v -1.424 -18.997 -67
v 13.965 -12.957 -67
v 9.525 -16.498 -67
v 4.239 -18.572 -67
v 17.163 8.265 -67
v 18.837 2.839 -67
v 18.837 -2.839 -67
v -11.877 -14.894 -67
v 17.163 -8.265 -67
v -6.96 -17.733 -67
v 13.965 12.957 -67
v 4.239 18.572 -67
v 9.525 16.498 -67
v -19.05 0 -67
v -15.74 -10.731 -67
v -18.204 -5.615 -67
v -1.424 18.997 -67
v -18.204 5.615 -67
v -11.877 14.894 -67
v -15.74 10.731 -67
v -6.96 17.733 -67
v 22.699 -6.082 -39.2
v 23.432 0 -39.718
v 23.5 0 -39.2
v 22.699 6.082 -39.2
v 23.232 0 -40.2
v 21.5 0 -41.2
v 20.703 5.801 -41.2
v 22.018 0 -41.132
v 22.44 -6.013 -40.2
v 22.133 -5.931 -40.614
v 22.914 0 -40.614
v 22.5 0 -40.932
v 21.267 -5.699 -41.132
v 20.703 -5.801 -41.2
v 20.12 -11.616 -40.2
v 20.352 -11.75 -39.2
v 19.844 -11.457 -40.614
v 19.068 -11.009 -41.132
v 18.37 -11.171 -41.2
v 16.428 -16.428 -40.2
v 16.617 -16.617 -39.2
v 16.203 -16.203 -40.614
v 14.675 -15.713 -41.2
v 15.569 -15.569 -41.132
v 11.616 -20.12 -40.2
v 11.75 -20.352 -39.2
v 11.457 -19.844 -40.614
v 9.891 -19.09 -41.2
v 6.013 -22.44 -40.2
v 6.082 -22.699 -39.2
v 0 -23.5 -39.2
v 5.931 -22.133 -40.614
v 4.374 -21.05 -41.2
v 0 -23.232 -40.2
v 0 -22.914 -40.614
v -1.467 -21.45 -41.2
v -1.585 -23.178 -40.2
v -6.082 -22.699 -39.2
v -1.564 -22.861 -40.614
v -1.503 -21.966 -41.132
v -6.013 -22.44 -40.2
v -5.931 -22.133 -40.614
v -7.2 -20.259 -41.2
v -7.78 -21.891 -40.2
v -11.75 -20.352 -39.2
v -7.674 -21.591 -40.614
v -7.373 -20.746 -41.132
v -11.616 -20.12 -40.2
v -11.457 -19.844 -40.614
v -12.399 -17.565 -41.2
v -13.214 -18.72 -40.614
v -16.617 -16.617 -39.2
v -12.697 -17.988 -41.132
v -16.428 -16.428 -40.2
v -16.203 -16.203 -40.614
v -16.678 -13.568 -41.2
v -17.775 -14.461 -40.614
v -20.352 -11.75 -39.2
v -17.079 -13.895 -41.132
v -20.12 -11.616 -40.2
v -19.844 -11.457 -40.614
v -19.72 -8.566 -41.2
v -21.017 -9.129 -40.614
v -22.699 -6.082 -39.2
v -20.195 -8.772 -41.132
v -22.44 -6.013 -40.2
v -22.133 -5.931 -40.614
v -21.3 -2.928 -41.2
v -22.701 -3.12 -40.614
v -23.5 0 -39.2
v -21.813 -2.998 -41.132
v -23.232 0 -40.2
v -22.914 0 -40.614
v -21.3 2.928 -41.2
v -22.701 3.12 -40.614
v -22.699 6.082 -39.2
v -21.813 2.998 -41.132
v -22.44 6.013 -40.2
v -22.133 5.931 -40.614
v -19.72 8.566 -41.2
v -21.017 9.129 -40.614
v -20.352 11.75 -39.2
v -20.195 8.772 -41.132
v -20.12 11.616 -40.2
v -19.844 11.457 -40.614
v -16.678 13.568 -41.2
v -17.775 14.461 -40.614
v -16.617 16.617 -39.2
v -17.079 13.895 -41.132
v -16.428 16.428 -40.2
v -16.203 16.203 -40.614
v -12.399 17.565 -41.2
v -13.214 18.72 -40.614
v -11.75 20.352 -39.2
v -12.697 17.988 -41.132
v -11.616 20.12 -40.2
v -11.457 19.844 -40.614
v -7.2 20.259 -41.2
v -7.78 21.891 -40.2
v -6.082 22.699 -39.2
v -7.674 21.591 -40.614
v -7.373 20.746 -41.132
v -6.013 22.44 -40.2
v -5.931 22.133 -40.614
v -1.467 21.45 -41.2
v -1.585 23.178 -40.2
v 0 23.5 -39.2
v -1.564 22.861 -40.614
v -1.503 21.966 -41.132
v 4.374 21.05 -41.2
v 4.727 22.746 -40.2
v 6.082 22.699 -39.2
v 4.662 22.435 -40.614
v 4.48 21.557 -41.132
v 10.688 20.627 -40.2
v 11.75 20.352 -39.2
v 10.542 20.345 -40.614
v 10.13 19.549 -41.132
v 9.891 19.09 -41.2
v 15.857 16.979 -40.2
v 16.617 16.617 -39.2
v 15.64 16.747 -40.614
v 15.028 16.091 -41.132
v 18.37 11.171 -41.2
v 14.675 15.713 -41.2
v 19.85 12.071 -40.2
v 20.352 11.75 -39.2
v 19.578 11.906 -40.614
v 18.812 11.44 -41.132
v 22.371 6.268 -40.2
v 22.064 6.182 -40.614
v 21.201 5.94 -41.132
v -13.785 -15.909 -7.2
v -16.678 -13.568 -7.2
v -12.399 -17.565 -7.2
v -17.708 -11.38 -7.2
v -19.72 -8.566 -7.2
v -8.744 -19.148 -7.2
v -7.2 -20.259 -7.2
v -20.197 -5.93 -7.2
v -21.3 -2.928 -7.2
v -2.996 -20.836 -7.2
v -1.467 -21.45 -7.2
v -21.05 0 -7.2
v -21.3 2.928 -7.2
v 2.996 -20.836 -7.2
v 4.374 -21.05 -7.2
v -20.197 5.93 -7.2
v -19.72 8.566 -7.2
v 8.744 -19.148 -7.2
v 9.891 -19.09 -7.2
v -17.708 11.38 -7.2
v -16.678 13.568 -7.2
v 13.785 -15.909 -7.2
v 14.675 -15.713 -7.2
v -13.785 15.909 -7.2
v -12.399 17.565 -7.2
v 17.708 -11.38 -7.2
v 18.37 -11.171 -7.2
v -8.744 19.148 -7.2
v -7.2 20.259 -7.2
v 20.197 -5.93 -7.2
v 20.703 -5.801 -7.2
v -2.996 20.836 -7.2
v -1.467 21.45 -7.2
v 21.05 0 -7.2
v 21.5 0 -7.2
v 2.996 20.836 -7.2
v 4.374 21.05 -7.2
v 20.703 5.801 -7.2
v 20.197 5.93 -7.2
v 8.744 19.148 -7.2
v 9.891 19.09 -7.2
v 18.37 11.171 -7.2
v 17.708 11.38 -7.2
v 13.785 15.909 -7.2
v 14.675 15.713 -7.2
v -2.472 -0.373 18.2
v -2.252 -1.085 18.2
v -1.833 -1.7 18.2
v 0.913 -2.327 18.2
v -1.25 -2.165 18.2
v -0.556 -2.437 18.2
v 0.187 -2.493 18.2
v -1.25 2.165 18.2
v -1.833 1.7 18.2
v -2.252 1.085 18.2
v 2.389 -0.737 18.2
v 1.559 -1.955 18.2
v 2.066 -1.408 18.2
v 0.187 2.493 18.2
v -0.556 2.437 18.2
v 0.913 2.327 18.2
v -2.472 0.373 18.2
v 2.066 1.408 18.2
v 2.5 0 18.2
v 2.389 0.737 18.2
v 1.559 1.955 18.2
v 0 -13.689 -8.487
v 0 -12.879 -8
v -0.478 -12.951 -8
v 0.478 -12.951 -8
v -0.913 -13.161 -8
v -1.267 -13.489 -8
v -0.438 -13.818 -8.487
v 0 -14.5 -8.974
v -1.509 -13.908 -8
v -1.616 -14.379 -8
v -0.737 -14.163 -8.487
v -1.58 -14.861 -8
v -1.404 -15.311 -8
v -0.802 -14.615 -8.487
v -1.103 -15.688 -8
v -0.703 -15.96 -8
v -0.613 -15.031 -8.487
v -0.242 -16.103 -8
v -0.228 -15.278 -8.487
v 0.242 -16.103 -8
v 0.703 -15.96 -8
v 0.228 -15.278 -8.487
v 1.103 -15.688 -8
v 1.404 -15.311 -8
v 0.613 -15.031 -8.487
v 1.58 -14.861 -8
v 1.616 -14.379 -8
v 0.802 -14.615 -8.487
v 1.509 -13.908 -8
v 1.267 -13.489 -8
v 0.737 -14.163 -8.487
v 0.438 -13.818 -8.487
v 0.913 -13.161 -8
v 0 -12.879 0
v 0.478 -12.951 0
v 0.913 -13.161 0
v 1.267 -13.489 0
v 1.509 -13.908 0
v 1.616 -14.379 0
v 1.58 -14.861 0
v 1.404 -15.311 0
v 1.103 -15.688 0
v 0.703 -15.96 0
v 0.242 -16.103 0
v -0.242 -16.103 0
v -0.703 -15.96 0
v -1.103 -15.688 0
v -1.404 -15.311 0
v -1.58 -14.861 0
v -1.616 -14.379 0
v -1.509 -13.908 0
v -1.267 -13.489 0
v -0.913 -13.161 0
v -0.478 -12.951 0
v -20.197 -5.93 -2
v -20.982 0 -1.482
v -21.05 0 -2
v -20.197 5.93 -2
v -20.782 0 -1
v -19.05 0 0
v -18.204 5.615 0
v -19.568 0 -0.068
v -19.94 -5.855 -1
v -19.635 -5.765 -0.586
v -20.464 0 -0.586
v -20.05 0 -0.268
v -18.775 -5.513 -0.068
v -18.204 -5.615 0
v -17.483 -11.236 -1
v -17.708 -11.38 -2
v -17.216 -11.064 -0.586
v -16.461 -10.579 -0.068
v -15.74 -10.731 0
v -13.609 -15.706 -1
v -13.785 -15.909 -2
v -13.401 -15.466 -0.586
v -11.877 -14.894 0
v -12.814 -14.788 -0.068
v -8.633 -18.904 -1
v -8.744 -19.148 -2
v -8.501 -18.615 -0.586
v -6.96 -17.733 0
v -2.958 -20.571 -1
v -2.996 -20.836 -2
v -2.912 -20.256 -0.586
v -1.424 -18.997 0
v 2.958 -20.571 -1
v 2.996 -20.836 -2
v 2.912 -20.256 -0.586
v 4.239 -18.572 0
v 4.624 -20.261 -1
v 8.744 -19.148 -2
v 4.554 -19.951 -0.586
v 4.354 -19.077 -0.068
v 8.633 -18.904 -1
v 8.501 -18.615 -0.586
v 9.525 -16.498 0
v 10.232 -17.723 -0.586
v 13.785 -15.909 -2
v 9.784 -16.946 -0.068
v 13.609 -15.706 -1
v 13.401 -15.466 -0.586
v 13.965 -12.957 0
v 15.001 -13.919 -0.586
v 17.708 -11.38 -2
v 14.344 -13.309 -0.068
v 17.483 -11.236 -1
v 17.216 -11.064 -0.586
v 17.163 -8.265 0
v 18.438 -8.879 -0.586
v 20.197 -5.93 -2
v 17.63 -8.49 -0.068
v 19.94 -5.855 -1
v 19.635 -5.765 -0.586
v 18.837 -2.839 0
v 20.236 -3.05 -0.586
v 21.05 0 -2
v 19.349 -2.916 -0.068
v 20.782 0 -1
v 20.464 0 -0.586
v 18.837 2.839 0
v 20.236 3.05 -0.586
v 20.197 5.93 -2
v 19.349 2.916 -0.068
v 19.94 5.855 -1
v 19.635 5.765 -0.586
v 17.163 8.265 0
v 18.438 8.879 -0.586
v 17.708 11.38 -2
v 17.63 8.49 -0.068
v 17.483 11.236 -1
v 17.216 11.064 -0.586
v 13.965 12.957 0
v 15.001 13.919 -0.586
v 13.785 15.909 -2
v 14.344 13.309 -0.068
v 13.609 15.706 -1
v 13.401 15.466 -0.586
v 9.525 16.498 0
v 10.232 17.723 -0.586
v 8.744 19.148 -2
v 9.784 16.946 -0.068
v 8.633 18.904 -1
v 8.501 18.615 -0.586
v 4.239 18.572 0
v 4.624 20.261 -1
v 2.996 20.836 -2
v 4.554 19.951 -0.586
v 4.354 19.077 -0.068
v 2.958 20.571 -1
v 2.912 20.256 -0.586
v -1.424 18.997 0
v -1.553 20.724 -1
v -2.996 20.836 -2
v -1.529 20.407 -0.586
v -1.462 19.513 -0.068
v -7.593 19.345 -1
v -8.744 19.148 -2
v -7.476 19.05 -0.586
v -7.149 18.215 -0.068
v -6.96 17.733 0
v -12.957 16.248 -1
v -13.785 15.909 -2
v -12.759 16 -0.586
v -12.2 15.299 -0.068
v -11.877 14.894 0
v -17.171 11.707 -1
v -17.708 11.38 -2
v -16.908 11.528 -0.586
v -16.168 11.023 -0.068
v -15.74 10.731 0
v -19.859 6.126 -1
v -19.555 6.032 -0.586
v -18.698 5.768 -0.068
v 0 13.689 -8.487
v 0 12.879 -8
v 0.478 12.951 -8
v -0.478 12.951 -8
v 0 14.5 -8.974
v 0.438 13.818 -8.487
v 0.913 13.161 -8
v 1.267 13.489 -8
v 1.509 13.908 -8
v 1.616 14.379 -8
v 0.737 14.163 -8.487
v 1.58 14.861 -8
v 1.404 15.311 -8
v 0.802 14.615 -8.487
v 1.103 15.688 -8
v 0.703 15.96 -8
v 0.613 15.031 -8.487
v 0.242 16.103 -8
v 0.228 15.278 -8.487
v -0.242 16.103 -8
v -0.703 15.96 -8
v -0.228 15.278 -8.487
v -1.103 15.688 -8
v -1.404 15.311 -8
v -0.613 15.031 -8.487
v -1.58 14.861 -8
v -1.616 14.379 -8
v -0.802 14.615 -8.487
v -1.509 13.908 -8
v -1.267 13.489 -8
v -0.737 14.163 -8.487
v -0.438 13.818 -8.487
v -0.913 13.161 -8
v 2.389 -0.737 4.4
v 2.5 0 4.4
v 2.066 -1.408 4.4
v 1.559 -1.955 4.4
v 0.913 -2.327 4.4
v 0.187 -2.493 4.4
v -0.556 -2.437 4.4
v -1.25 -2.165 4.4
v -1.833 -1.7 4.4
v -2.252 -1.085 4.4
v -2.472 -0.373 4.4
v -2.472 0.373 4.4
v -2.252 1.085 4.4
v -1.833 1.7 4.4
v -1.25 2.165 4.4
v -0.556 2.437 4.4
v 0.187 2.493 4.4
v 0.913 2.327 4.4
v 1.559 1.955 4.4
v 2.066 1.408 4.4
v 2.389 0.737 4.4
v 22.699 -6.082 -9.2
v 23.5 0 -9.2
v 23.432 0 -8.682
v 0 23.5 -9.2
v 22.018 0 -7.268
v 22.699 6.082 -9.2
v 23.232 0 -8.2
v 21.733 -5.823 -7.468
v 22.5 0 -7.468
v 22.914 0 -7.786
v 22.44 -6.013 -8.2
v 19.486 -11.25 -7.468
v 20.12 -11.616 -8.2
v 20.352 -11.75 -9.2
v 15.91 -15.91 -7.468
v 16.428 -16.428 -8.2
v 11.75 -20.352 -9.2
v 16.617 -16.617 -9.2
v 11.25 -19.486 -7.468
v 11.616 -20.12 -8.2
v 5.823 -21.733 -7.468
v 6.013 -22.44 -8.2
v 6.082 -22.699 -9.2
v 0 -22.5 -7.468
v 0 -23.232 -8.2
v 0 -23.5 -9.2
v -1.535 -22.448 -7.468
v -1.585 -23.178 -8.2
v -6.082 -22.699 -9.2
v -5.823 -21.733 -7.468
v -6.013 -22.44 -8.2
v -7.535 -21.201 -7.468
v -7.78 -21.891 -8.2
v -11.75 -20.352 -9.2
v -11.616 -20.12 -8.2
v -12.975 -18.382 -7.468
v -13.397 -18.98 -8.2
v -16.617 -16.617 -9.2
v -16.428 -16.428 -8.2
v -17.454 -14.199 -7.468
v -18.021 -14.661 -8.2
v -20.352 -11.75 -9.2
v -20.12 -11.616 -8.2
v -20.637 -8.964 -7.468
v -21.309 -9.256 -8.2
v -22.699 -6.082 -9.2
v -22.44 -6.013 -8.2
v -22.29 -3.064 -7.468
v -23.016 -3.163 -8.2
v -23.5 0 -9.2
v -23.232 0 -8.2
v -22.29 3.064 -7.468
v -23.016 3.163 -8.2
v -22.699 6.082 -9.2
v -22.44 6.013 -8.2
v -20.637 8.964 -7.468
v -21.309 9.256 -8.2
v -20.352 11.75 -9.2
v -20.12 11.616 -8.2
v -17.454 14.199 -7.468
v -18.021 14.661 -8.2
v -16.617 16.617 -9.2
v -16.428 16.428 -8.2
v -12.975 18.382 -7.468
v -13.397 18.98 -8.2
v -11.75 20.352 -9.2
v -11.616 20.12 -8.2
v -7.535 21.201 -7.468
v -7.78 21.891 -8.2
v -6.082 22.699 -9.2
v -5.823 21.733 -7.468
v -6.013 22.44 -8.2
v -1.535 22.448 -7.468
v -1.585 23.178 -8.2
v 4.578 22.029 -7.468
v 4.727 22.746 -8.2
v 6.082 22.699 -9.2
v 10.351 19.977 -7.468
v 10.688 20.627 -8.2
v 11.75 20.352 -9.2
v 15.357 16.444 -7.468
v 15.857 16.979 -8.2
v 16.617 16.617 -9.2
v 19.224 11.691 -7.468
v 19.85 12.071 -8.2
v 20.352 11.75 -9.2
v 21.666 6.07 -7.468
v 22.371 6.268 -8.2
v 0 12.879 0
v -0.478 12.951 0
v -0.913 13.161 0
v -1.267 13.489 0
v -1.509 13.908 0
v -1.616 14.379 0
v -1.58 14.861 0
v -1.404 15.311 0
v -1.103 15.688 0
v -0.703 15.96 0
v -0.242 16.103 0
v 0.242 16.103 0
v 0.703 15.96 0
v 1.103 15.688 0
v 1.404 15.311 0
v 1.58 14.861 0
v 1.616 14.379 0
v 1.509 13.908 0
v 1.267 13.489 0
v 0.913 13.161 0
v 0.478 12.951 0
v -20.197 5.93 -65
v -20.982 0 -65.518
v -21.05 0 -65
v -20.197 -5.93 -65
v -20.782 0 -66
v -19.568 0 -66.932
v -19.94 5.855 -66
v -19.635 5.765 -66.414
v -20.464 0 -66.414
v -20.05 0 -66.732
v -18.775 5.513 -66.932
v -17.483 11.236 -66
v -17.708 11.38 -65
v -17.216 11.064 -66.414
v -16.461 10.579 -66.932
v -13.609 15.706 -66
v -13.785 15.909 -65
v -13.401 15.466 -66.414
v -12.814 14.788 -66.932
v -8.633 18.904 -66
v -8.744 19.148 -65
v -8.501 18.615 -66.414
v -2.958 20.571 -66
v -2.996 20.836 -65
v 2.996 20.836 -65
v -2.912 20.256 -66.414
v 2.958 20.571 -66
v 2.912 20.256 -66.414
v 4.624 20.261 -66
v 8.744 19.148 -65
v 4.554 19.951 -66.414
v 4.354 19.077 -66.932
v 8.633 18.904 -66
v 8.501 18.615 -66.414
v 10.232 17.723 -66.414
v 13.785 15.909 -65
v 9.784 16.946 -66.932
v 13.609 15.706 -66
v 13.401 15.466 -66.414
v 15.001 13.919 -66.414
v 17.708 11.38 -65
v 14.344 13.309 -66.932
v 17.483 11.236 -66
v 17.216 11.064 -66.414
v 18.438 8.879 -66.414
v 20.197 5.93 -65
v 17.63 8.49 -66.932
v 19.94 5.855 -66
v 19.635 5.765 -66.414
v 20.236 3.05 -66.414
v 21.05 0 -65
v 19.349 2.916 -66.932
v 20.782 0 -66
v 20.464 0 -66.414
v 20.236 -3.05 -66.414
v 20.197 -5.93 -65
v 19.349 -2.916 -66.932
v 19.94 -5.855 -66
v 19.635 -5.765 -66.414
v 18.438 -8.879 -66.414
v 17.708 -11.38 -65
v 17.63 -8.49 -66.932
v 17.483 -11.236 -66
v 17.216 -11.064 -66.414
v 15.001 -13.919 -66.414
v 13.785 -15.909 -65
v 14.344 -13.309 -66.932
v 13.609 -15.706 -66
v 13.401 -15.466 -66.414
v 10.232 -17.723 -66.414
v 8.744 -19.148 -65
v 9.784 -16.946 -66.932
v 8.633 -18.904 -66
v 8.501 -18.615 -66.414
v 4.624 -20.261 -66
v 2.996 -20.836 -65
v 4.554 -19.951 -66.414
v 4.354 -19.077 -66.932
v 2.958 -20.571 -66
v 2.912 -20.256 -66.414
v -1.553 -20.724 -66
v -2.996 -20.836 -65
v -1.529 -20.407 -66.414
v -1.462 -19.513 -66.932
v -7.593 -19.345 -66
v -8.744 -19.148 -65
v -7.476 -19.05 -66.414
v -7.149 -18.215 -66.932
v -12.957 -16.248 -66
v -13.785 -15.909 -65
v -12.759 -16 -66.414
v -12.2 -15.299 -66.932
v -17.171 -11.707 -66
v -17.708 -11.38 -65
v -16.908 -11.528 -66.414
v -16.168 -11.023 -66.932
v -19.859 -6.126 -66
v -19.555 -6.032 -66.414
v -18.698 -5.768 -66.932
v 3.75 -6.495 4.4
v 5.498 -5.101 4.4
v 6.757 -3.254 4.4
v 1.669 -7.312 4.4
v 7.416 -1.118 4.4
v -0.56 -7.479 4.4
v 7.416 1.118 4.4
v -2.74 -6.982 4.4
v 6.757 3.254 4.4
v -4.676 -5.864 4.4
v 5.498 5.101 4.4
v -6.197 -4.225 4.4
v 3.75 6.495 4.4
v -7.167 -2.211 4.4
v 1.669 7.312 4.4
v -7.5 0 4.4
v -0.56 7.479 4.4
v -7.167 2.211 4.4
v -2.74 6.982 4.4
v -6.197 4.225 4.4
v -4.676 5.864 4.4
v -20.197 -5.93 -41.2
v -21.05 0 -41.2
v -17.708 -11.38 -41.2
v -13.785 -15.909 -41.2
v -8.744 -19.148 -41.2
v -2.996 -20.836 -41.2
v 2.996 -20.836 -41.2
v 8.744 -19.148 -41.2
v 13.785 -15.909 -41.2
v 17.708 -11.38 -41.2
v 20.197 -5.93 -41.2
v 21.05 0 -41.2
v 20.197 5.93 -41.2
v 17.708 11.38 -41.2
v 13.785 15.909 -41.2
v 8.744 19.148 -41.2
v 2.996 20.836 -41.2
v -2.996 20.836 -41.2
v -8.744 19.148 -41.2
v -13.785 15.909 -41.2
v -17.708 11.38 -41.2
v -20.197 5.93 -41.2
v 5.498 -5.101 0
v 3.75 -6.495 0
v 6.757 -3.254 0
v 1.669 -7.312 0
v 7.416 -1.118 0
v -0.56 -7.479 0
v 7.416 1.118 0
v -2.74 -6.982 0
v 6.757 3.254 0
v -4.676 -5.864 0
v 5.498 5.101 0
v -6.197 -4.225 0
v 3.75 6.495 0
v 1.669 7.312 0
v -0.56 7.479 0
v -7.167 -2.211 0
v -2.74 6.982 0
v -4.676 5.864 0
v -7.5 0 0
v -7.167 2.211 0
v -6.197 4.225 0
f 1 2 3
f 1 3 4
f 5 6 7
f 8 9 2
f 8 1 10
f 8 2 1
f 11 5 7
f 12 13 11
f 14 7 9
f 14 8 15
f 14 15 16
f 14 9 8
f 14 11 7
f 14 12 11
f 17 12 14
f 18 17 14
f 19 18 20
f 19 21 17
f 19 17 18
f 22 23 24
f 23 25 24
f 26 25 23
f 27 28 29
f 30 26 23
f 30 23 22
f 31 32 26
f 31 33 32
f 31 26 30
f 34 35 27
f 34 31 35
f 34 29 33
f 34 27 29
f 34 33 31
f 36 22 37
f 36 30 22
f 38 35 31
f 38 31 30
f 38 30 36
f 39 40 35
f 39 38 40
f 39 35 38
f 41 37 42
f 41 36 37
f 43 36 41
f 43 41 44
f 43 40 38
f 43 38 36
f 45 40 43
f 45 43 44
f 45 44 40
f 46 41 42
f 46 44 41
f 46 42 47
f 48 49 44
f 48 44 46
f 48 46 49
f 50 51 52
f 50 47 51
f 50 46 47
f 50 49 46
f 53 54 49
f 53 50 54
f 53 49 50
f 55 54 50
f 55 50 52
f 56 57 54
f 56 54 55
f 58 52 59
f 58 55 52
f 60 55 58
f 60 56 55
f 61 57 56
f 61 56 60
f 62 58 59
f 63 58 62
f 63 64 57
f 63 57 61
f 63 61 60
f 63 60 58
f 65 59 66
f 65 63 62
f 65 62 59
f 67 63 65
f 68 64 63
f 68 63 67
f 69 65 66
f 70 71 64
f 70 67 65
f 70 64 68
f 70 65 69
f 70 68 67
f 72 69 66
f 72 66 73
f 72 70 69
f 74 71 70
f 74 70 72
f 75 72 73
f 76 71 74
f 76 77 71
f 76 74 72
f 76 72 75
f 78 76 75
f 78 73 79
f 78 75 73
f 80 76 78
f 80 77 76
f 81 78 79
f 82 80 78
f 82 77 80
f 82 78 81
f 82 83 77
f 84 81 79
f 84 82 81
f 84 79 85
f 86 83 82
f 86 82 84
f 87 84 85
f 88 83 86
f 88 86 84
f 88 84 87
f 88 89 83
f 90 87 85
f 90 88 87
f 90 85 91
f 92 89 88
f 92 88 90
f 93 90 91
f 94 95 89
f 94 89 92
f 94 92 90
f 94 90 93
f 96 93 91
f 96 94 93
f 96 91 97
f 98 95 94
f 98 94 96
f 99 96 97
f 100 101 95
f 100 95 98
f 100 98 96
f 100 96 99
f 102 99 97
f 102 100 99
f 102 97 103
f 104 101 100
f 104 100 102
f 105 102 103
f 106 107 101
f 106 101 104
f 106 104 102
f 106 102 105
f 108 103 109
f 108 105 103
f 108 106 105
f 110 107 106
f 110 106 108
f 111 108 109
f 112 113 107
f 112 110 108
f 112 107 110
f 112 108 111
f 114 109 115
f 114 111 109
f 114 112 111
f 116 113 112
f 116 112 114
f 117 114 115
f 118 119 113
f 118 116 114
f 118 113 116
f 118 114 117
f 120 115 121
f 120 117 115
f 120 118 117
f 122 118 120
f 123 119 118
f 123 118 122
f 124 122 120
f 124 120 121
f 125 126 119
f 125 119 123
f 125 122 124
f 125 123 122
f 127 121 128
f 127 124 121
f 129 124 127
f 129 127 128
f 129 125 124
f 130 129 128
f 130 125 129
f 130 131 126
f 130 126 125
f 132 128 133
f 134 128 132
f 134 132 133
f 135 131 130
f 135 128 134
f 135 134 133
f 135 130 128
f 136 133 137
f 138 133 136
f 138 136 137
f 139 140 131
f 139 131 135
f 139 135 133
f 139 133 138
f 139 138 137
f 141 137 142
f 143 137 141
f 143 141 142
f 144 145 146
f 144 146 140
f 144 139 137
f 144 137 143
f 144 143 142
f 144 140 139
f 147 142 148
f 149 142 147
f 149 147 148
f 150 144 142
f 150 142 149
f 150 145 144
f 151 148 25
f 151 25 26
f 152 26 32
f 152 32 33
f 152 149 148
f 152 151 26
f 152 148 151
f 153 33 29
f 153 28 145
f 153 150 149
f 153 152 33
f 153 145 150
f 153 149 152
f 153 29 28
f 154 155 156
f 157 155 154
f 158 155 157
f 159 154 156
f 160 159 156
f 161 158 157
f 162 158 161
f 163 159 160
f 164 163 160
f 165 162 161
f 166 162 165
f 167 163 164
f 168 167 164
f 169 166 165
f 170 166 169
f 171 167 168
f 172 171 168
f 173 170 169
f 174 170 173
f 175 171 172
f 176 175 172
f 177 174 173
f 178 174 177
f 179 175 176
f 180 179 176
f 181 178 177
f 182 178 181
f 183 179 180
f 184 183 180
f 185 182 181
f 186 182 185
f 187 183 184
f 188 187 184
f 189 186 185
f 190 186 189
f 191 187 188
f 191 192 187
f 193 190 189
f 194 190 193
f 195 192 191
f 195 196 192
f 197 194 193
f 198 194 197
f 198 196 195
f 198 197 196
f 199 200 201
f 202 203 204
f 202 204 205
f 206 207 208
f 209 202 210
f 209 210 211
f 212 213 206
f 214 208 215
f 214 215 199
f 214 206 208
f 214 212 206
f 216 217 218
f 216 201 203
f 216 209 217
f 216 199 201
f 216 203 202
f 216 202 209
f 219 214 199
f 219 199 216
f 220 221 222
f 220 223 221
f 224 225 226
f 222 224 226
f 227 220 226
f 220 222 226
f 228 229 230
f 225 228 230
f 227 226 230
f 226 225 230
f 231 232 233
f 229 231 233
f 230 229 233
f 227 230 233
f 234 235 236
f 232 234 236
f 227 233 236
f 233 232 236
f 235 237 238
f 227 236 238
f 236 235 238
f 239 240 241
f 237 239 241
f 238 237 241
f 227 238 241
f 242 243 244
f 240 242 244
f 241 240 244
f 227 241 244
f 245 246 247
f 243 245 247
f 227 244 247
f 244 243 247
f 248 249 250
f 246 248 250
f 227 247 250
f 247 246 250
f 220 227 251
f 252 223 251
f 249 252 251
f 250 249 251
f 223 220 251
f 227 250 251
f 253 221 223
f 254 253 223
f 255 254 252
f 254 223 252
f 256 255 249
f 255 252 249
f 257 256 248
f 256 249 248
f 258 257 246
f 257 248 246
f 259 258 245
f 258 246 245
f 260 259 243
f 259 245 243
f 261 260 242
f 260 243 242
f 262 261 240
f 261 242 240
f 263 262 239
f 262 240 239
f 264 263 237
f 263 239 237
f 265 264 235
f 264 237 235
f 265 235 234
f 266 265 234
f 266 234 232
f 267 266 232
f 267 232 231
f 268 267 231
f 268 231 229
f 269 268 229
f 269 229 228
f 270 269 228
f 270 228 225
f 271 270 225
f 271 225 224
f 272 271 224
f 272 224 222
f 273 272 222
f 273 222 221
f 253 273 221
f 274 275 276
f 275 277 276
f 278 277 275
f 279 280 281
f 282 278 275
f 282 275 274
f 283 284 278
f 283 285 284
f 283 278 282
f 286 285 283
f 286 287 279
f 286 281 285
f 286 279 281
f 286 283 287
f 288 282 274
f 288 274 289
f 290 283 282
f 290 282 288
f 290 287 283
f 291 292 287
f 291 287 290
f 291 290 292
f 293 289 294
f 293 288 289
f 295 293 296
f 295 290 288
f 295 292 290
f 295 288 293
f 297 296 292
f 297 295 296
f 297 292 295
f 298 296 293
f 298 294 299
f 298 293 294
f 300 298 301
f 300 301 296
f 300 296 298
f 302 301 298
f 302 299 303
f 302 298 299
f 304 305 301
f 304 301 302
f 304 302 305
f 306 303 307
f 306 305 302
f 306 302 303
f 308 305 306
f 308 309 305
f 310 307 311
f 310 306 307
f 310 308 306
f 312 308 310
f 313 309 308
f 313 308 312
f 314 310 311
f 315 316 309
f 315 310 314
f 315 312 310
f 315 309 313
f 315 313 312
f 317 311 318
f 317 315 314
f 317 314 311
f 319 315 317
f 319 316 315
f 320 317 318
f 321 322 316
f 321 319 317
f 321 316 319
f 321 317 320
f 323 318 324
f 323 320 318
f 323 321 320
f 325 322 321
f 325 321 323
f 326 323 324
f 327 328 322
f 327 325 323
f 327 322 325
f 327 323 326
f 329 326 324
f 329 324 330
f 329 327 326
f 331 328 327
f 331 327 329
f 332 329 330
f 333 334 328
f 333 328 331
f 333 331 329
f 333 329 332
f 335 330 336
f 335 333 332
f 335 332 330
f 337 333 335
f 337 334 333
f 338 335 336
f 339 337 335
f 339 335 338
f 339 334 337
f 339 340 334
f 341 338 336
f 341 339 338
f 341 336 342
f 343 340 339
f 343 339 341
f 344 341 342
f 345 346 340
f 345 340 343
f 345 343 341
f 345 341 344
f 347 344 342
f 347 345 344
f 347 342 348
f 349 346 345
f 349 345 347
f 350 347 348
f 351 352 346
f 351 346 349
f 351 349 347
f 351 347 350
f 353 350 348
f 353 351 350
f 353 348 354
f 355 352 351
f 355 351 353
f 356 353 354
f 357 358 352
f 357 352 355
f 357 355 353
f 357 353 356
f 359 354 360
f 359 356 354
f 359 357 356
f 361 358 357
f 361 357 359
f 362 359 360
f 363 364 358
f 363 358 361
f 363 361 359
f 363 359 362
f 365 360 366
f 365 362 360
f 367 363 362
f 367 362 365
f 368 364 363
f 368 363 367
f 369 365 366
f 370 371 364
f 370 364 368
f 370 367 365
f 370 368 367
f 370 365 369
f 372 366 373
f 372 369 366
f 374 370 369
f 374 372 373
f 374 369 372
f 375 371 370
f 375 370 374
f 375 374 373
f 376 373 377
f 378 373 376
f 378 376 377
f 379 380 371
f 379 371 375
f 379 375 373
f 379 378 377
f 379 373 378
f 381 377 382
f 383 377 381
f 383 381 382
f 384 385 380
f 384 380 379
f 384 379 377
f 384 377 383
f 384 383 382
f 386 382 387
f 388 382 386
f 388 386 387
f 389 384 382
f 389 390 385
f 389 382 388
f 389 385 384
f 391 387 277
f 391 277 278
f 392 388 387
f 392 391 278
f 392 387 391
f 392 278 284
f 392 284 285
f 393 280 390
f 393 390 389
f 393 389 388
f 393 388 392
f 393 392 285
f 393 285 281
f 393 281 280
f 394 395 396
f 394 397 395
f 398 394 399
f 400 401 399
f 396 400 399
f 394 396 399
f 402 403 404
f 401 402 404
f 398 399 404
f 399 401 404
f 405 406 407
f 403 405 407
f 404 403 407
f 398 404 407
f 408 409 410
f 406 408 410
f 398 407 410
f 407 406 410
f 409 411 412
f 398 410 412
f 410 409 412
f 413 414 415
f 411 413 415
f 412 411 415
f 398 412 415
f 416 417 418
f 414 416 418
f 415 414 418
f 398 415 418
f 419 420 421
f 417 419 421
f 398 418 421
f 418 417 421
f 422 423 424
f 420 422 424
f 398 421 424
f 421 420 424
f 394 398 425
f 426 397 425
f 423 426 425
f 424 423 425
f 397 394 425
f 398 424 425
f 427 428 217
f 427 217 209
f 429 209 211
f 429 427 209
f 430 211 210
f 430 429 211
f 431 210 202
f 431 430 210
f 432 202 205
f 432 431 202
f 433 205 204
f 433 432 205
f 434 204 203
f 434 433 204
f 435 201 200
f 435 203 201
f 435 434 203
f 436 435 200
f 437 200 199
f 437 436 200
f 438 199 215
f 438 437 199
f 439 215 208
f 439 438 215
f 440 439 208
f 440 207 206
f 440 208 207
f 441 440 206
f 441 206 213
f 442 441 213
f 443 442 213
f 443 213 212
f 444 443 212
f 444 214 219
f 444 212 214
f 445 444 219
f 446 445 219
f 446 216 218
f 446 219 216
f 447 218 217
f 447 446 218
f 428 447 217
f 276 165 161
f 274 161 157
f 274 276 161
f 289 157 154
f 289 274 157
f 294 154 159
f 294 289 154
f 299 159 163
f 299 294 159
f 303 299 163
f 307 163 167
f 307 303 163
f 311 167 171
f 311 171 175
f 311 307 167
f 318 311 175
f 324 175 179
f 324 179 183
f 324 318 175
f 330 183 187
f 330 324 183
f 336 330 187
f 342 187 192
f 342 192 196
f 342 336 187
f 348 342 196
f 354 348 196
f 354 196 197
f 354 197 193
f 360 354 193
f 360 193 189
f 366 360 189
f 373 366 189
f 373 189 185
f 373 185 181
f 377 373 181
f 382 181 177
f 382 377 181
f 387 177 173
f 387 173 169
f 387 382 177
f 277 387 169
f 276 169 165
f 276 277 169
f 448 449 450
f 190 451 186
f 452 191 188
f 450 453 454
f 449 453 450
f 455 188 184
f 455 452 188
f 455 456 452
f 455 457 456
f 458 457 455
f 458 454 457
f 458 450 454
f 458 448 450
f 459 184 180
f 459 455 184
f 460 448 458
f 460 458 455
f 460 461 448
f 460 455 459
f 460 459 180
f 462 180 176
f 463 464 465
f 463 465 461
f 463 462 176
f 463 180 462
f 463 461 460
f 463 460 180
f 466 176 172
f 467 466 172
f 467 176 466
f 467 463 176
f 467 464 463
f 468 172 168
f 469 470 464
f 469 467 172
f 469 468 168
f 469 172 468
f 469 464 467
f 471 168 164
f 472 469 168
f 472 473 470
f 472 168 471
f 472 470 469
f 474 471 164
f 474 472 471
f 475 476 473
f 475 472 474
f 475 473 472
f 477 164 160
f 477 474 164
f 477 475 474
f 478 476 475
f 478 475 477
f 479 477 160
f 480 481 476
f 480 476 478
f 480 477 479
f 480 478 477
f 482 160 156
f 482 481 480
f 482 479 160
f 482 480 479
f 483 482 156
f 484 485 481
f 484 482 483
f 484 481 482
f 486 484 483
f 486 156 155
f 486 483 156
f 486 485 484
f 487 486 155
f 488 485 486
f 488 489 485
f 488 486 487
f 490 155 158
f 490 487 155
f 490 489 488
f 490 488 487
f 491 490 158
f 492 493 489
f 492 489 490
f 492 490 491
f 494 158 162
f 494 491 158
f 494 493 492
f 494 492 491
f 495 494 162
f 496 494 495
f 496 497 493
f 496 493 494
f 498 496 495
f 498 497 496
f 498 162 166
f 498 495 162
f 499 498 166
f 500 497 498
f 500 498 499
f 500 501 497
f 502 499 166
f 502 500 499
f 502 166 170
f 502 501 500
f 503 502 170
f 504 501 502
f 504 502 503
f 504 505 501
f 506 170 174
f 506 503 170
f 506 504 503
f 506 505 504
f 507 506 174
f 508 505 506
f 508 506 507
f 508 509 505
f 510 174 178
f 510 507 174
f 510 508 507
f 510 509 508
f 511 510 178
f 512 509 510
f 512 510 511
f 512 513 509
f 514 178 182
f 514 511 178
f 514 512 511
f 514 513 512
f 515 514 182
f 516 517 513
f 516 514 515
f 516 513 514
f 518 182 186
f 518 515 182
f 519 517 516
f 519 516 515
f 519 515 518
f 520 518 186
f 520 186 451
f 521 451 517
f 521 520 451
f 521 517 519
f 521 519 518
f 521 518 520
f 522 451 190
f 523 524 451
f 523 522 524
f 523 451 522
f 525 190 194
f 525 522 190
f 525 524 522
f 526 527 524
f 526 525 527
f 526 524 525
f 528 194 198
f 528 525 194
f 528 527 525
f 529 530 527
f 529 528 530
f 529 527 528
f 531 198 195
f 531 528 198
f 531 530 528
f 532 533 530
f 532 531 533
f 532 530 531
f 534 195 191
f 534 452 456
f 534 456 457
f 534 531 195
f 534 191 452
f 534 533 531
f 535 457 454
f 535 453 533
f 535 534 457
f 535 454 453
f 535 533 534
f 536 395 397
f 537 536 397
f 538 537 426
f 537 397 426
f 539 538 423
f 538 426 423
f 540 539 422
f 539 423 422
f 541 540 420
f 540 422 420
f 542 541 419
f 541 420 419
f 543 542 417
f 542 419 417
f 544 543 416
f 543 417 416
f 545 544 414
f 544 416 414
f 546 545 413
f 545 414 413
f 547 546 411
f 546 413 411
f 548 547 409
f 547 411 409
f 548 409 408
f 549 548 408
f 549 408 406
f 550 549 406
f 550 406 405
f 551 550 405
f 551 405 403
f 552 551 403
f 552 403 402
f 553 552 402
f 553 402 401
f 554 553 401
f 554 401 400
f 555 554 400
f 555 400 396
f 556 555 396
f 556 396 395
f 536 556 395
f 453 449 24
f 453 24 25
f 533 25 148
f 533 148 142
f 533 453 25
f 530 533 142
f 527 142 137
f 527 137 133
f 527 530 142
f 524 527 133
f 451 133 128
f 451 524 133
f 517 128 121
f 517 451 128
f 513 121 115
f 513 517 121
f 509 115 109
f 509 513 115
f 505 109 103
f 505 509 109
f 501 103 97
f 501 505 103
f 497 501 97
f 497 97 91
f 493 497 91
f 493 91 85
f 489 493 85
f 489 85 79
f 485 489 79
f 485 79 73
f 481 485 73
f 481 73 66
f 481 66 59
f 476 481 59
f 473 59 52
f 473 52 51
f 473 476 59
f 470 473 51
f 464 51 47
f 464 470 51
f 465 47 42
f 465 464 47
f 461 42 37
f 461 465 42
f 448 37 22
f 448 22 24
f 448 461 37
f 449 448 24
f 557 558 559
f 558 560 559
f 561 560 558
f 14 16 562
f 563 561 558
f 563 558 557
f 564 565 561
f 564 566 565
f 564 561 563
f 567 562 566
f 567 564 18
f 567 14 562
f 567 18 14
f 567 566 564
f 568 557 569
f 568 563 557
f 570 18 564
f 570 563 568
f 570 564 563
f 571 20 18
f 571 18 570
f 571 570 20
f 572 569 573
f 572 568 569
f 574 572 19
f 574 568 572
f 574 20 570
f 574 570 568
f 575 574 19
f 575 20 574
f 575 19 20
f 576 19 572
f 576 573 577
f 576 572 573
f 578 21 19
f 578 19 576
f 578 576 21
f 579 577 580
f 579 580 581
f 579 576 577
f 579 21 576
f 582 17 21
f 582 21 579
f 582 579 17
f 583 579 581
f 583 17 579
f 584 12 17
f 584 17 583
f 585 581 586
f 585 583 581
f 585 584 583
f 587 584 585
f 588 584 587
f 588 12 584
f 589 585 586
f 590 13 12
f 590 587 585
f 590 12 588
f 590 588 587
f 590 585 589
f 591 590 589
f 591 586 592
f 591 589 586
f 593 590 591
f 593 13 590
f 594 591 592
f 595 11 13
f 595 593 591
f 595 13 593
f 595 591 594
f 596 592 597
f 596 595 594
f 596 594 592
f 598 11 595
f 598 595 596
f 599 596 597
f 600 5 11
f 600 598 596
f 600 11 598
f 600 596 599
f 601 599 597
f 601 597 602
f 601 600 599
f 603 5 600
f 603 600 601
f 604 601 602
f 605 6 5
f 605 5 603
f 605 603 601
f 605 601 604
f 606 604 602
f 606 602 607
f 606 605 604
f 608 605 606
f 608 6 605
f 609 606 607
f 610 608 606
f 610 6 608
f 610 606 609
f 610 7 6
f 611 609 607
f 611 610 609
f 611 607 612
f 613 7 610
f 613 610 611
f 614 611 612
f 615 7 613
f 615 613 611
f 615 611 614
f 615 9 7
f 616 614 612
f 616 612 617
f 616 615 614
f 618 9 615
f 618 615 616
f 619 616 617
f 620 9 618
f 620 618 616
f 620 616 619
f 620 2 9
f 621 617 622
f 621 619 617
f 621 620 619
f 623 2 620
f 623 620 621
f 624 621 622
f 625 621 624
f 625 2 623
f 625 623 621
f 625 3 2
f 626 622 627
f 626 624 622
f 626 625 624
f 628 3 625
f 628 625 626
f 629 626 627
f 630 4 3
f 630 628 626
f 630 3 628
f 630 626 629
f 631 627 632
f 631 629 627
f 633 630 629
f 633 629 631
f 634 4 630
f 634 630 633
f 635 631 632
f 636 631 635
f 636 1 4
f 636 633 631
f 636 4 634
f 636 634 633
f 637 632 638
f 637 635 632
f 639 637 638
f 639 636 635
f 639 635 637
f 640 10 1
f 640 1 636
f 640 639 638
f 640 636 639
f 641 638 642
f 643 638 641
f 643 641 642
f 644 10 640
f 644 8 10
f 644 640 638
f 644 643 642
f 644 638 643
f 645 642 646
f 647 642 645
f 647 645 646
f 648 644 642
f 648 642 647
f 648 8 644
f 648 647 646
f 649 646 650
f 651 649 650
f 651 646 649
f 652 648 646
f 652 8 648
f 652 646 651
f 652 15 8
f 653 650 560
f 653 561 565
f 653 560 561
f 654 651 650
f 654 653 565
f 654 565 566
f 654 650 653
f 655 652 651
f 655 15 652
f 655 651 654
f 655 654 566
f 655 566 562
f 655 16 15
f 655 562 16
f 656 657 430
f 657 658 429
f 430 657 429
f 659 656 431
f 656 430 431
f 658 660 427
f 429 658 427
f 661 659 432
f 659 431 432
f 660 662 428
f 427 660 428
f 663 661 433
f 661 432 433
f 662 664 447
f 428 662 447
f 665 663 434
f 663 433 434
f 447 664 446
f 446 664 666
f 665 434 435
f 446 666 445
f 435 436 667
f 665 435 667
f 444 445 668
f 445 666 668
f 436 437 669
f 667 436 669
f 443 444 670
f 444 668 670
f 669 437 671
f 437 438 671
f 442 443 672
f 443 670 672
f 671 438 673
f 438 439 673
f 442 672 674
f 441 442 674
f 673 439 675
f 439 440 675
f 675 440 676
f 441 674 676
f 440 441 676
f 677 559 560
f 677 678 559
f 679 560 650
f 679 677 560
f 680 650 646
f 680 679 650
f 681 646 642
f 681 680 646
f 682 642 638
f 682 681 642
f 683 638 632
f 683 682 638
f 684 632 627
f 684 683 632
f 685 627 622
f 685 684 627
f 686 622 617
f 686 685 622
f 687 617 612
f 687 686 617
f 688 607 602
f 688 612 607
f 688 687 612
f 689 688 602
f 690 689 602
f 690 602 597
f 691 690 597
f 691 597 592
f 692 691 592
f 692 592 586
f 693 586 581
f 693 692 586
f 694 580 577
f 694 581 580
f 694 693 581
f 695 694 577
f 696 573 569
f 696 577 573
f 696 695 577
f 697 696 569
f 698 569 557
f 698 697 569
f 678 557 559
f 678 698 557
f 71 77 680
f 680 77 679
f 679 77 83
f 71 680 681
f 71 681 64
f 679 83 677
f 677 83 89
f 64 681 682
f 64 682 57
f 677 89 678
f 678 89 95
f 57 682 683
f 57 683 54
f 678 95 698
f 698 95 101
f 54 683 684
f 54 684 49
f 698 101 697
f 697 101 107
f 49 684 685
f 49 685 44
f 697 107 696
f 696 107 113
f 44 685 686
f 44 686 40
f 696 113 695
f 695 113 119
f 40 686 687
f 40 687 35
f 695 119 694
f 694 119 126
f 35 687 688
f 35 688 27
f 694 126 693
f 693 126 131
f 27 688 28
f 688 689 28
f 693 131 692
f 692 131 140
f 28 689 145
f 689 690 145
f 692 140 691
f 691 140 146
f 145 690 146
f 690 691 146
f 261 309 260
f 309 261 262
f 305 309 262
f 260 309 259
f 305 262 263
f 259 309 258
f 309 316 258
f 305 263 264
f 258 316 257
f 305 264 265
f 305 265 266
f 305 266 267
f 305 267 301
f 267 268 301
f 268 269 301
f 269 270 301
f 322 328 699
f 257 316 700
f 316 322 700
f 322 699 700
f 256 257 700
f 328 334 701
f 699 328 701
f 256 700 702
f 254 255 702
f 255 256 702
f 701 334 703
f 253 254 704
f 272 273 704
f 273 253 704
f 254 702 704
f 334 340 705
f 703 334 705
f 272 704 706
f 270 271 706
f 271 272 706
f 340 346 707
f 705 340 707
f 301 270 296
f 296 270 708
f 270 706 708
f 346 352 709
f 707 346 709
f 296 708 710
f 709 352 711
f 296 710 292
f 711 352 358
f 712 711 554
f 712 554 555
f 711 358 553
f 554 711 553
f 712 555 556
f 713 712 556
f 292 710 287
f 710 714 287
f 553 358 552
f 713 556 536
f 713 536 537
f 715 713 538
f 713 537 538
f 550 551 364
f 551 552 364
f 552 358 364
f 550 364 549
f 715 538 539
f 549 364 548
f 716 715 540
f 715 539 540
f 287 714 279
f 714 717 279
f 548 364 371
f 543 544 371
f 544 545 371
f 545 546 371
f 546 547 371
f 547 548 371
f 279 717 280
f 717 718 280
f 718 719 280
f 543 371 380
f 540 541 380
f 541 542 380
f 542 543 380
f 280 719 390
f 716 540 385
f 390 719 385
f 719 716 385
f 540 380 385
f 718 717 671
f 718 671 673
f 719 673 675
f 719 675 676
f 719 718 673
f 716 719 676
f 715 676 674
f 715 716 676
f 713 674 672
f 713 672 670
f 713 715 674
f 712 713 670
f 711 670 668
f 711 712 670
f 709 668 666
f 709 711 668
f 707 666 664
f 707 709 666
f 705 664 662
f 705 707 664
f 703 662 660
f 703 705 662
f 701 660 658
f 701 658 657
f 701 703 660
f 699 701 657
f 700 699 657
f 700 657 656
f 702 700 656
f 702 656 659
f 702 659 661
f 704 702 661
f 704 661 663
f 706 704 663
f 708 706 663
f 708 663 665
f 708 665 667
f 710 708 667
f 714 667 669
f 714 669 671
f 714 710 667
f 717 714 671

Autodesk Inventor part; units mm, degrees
ref_plane "YZ Plane" through (0, 0, 0) normal (1, 0, 0) x (0, 1, 0)
ref_plane "XZ Plane" through (0, 0, 0) normal (0, 1, 0) x (-1, 0, 0)
sketch "スケッチ1" plane through (0, 0, 0) normal (0, 0, 1) x (1, 0, 0)
  circle A0 centre (0, 0) radius 2.5
  dimension "d0" = 5
extrude "押し出し1" add sketch "スケッチ1" along normal blind 18.2
sketch "スケッチ2" plane through (0, 0, 0) normal (0, 0, -1) x (-1, 0, 0)
  circle A0 centre (0, 0) radius 2.5 projected
  circle A1 centre (0, 0) radius 7.5
  dimension "d3" = 15
extrude "押し出し2" add sketch "スケッチ2" against normal blind 4.4
sketch "スケッチ3" plane through (0, 0, 0) normal (0, 0, -1) x (-1, 0, 0)
  circle A0 centre (0, 0) radius 7.5 projected
  circle A1 centre (0, 0) radius 21.05
  dimension "d6" = 42.1
extrude "押し出し3" add sketch "スケッチ3" along normal blind 67 contours A0 | A1
ref_plane "作業平面1" through (0, 0, -7.2) normal (0, 0, 1) x (1, 0, 0)
sketch "スケッチ6" plane through (0, 0, -7.2) normal (0, 0, 1) x (1, 0, 0)
  circle A0 centre (0, 0) radius 23.5
  dimension "d14" = 47
extrude "押し出し5" add sketch "スケッチ6" against normal blind 34
sketch "スケッチ7" plane through (0, 0, 0) normal (0, 0, 1) x (1, 0, 0)
  circle A0 centre (0, 14.5) radius 0.9915
  circle A1 centre (0, 0) radius 2.5 projected
  dimension "d17" = 14.5
hole "穴1" at (0, 14.5, 0) direction (0, 0, -1) diameter 3.242 depth 8 tip angle 118 thread size "M4x0.7" class "6H" standard "ISO Metric profile"
pattern_circular "放射状パターン1" count 2 over 360 about axis through (0, 0, 0) along (0, 0, 1) of "穴1"
fillet "フィレット1" radius 2 1 edges at (21.05, 0, 0)
fillet "フィレット2" radius 2 2 edges at (-23.5, 0, -7.2) (-23.5, 0, -41.2)
fillet "フィレット3" radius 2 1 edges at (21.05, 0, -67)
properties part number "775"
